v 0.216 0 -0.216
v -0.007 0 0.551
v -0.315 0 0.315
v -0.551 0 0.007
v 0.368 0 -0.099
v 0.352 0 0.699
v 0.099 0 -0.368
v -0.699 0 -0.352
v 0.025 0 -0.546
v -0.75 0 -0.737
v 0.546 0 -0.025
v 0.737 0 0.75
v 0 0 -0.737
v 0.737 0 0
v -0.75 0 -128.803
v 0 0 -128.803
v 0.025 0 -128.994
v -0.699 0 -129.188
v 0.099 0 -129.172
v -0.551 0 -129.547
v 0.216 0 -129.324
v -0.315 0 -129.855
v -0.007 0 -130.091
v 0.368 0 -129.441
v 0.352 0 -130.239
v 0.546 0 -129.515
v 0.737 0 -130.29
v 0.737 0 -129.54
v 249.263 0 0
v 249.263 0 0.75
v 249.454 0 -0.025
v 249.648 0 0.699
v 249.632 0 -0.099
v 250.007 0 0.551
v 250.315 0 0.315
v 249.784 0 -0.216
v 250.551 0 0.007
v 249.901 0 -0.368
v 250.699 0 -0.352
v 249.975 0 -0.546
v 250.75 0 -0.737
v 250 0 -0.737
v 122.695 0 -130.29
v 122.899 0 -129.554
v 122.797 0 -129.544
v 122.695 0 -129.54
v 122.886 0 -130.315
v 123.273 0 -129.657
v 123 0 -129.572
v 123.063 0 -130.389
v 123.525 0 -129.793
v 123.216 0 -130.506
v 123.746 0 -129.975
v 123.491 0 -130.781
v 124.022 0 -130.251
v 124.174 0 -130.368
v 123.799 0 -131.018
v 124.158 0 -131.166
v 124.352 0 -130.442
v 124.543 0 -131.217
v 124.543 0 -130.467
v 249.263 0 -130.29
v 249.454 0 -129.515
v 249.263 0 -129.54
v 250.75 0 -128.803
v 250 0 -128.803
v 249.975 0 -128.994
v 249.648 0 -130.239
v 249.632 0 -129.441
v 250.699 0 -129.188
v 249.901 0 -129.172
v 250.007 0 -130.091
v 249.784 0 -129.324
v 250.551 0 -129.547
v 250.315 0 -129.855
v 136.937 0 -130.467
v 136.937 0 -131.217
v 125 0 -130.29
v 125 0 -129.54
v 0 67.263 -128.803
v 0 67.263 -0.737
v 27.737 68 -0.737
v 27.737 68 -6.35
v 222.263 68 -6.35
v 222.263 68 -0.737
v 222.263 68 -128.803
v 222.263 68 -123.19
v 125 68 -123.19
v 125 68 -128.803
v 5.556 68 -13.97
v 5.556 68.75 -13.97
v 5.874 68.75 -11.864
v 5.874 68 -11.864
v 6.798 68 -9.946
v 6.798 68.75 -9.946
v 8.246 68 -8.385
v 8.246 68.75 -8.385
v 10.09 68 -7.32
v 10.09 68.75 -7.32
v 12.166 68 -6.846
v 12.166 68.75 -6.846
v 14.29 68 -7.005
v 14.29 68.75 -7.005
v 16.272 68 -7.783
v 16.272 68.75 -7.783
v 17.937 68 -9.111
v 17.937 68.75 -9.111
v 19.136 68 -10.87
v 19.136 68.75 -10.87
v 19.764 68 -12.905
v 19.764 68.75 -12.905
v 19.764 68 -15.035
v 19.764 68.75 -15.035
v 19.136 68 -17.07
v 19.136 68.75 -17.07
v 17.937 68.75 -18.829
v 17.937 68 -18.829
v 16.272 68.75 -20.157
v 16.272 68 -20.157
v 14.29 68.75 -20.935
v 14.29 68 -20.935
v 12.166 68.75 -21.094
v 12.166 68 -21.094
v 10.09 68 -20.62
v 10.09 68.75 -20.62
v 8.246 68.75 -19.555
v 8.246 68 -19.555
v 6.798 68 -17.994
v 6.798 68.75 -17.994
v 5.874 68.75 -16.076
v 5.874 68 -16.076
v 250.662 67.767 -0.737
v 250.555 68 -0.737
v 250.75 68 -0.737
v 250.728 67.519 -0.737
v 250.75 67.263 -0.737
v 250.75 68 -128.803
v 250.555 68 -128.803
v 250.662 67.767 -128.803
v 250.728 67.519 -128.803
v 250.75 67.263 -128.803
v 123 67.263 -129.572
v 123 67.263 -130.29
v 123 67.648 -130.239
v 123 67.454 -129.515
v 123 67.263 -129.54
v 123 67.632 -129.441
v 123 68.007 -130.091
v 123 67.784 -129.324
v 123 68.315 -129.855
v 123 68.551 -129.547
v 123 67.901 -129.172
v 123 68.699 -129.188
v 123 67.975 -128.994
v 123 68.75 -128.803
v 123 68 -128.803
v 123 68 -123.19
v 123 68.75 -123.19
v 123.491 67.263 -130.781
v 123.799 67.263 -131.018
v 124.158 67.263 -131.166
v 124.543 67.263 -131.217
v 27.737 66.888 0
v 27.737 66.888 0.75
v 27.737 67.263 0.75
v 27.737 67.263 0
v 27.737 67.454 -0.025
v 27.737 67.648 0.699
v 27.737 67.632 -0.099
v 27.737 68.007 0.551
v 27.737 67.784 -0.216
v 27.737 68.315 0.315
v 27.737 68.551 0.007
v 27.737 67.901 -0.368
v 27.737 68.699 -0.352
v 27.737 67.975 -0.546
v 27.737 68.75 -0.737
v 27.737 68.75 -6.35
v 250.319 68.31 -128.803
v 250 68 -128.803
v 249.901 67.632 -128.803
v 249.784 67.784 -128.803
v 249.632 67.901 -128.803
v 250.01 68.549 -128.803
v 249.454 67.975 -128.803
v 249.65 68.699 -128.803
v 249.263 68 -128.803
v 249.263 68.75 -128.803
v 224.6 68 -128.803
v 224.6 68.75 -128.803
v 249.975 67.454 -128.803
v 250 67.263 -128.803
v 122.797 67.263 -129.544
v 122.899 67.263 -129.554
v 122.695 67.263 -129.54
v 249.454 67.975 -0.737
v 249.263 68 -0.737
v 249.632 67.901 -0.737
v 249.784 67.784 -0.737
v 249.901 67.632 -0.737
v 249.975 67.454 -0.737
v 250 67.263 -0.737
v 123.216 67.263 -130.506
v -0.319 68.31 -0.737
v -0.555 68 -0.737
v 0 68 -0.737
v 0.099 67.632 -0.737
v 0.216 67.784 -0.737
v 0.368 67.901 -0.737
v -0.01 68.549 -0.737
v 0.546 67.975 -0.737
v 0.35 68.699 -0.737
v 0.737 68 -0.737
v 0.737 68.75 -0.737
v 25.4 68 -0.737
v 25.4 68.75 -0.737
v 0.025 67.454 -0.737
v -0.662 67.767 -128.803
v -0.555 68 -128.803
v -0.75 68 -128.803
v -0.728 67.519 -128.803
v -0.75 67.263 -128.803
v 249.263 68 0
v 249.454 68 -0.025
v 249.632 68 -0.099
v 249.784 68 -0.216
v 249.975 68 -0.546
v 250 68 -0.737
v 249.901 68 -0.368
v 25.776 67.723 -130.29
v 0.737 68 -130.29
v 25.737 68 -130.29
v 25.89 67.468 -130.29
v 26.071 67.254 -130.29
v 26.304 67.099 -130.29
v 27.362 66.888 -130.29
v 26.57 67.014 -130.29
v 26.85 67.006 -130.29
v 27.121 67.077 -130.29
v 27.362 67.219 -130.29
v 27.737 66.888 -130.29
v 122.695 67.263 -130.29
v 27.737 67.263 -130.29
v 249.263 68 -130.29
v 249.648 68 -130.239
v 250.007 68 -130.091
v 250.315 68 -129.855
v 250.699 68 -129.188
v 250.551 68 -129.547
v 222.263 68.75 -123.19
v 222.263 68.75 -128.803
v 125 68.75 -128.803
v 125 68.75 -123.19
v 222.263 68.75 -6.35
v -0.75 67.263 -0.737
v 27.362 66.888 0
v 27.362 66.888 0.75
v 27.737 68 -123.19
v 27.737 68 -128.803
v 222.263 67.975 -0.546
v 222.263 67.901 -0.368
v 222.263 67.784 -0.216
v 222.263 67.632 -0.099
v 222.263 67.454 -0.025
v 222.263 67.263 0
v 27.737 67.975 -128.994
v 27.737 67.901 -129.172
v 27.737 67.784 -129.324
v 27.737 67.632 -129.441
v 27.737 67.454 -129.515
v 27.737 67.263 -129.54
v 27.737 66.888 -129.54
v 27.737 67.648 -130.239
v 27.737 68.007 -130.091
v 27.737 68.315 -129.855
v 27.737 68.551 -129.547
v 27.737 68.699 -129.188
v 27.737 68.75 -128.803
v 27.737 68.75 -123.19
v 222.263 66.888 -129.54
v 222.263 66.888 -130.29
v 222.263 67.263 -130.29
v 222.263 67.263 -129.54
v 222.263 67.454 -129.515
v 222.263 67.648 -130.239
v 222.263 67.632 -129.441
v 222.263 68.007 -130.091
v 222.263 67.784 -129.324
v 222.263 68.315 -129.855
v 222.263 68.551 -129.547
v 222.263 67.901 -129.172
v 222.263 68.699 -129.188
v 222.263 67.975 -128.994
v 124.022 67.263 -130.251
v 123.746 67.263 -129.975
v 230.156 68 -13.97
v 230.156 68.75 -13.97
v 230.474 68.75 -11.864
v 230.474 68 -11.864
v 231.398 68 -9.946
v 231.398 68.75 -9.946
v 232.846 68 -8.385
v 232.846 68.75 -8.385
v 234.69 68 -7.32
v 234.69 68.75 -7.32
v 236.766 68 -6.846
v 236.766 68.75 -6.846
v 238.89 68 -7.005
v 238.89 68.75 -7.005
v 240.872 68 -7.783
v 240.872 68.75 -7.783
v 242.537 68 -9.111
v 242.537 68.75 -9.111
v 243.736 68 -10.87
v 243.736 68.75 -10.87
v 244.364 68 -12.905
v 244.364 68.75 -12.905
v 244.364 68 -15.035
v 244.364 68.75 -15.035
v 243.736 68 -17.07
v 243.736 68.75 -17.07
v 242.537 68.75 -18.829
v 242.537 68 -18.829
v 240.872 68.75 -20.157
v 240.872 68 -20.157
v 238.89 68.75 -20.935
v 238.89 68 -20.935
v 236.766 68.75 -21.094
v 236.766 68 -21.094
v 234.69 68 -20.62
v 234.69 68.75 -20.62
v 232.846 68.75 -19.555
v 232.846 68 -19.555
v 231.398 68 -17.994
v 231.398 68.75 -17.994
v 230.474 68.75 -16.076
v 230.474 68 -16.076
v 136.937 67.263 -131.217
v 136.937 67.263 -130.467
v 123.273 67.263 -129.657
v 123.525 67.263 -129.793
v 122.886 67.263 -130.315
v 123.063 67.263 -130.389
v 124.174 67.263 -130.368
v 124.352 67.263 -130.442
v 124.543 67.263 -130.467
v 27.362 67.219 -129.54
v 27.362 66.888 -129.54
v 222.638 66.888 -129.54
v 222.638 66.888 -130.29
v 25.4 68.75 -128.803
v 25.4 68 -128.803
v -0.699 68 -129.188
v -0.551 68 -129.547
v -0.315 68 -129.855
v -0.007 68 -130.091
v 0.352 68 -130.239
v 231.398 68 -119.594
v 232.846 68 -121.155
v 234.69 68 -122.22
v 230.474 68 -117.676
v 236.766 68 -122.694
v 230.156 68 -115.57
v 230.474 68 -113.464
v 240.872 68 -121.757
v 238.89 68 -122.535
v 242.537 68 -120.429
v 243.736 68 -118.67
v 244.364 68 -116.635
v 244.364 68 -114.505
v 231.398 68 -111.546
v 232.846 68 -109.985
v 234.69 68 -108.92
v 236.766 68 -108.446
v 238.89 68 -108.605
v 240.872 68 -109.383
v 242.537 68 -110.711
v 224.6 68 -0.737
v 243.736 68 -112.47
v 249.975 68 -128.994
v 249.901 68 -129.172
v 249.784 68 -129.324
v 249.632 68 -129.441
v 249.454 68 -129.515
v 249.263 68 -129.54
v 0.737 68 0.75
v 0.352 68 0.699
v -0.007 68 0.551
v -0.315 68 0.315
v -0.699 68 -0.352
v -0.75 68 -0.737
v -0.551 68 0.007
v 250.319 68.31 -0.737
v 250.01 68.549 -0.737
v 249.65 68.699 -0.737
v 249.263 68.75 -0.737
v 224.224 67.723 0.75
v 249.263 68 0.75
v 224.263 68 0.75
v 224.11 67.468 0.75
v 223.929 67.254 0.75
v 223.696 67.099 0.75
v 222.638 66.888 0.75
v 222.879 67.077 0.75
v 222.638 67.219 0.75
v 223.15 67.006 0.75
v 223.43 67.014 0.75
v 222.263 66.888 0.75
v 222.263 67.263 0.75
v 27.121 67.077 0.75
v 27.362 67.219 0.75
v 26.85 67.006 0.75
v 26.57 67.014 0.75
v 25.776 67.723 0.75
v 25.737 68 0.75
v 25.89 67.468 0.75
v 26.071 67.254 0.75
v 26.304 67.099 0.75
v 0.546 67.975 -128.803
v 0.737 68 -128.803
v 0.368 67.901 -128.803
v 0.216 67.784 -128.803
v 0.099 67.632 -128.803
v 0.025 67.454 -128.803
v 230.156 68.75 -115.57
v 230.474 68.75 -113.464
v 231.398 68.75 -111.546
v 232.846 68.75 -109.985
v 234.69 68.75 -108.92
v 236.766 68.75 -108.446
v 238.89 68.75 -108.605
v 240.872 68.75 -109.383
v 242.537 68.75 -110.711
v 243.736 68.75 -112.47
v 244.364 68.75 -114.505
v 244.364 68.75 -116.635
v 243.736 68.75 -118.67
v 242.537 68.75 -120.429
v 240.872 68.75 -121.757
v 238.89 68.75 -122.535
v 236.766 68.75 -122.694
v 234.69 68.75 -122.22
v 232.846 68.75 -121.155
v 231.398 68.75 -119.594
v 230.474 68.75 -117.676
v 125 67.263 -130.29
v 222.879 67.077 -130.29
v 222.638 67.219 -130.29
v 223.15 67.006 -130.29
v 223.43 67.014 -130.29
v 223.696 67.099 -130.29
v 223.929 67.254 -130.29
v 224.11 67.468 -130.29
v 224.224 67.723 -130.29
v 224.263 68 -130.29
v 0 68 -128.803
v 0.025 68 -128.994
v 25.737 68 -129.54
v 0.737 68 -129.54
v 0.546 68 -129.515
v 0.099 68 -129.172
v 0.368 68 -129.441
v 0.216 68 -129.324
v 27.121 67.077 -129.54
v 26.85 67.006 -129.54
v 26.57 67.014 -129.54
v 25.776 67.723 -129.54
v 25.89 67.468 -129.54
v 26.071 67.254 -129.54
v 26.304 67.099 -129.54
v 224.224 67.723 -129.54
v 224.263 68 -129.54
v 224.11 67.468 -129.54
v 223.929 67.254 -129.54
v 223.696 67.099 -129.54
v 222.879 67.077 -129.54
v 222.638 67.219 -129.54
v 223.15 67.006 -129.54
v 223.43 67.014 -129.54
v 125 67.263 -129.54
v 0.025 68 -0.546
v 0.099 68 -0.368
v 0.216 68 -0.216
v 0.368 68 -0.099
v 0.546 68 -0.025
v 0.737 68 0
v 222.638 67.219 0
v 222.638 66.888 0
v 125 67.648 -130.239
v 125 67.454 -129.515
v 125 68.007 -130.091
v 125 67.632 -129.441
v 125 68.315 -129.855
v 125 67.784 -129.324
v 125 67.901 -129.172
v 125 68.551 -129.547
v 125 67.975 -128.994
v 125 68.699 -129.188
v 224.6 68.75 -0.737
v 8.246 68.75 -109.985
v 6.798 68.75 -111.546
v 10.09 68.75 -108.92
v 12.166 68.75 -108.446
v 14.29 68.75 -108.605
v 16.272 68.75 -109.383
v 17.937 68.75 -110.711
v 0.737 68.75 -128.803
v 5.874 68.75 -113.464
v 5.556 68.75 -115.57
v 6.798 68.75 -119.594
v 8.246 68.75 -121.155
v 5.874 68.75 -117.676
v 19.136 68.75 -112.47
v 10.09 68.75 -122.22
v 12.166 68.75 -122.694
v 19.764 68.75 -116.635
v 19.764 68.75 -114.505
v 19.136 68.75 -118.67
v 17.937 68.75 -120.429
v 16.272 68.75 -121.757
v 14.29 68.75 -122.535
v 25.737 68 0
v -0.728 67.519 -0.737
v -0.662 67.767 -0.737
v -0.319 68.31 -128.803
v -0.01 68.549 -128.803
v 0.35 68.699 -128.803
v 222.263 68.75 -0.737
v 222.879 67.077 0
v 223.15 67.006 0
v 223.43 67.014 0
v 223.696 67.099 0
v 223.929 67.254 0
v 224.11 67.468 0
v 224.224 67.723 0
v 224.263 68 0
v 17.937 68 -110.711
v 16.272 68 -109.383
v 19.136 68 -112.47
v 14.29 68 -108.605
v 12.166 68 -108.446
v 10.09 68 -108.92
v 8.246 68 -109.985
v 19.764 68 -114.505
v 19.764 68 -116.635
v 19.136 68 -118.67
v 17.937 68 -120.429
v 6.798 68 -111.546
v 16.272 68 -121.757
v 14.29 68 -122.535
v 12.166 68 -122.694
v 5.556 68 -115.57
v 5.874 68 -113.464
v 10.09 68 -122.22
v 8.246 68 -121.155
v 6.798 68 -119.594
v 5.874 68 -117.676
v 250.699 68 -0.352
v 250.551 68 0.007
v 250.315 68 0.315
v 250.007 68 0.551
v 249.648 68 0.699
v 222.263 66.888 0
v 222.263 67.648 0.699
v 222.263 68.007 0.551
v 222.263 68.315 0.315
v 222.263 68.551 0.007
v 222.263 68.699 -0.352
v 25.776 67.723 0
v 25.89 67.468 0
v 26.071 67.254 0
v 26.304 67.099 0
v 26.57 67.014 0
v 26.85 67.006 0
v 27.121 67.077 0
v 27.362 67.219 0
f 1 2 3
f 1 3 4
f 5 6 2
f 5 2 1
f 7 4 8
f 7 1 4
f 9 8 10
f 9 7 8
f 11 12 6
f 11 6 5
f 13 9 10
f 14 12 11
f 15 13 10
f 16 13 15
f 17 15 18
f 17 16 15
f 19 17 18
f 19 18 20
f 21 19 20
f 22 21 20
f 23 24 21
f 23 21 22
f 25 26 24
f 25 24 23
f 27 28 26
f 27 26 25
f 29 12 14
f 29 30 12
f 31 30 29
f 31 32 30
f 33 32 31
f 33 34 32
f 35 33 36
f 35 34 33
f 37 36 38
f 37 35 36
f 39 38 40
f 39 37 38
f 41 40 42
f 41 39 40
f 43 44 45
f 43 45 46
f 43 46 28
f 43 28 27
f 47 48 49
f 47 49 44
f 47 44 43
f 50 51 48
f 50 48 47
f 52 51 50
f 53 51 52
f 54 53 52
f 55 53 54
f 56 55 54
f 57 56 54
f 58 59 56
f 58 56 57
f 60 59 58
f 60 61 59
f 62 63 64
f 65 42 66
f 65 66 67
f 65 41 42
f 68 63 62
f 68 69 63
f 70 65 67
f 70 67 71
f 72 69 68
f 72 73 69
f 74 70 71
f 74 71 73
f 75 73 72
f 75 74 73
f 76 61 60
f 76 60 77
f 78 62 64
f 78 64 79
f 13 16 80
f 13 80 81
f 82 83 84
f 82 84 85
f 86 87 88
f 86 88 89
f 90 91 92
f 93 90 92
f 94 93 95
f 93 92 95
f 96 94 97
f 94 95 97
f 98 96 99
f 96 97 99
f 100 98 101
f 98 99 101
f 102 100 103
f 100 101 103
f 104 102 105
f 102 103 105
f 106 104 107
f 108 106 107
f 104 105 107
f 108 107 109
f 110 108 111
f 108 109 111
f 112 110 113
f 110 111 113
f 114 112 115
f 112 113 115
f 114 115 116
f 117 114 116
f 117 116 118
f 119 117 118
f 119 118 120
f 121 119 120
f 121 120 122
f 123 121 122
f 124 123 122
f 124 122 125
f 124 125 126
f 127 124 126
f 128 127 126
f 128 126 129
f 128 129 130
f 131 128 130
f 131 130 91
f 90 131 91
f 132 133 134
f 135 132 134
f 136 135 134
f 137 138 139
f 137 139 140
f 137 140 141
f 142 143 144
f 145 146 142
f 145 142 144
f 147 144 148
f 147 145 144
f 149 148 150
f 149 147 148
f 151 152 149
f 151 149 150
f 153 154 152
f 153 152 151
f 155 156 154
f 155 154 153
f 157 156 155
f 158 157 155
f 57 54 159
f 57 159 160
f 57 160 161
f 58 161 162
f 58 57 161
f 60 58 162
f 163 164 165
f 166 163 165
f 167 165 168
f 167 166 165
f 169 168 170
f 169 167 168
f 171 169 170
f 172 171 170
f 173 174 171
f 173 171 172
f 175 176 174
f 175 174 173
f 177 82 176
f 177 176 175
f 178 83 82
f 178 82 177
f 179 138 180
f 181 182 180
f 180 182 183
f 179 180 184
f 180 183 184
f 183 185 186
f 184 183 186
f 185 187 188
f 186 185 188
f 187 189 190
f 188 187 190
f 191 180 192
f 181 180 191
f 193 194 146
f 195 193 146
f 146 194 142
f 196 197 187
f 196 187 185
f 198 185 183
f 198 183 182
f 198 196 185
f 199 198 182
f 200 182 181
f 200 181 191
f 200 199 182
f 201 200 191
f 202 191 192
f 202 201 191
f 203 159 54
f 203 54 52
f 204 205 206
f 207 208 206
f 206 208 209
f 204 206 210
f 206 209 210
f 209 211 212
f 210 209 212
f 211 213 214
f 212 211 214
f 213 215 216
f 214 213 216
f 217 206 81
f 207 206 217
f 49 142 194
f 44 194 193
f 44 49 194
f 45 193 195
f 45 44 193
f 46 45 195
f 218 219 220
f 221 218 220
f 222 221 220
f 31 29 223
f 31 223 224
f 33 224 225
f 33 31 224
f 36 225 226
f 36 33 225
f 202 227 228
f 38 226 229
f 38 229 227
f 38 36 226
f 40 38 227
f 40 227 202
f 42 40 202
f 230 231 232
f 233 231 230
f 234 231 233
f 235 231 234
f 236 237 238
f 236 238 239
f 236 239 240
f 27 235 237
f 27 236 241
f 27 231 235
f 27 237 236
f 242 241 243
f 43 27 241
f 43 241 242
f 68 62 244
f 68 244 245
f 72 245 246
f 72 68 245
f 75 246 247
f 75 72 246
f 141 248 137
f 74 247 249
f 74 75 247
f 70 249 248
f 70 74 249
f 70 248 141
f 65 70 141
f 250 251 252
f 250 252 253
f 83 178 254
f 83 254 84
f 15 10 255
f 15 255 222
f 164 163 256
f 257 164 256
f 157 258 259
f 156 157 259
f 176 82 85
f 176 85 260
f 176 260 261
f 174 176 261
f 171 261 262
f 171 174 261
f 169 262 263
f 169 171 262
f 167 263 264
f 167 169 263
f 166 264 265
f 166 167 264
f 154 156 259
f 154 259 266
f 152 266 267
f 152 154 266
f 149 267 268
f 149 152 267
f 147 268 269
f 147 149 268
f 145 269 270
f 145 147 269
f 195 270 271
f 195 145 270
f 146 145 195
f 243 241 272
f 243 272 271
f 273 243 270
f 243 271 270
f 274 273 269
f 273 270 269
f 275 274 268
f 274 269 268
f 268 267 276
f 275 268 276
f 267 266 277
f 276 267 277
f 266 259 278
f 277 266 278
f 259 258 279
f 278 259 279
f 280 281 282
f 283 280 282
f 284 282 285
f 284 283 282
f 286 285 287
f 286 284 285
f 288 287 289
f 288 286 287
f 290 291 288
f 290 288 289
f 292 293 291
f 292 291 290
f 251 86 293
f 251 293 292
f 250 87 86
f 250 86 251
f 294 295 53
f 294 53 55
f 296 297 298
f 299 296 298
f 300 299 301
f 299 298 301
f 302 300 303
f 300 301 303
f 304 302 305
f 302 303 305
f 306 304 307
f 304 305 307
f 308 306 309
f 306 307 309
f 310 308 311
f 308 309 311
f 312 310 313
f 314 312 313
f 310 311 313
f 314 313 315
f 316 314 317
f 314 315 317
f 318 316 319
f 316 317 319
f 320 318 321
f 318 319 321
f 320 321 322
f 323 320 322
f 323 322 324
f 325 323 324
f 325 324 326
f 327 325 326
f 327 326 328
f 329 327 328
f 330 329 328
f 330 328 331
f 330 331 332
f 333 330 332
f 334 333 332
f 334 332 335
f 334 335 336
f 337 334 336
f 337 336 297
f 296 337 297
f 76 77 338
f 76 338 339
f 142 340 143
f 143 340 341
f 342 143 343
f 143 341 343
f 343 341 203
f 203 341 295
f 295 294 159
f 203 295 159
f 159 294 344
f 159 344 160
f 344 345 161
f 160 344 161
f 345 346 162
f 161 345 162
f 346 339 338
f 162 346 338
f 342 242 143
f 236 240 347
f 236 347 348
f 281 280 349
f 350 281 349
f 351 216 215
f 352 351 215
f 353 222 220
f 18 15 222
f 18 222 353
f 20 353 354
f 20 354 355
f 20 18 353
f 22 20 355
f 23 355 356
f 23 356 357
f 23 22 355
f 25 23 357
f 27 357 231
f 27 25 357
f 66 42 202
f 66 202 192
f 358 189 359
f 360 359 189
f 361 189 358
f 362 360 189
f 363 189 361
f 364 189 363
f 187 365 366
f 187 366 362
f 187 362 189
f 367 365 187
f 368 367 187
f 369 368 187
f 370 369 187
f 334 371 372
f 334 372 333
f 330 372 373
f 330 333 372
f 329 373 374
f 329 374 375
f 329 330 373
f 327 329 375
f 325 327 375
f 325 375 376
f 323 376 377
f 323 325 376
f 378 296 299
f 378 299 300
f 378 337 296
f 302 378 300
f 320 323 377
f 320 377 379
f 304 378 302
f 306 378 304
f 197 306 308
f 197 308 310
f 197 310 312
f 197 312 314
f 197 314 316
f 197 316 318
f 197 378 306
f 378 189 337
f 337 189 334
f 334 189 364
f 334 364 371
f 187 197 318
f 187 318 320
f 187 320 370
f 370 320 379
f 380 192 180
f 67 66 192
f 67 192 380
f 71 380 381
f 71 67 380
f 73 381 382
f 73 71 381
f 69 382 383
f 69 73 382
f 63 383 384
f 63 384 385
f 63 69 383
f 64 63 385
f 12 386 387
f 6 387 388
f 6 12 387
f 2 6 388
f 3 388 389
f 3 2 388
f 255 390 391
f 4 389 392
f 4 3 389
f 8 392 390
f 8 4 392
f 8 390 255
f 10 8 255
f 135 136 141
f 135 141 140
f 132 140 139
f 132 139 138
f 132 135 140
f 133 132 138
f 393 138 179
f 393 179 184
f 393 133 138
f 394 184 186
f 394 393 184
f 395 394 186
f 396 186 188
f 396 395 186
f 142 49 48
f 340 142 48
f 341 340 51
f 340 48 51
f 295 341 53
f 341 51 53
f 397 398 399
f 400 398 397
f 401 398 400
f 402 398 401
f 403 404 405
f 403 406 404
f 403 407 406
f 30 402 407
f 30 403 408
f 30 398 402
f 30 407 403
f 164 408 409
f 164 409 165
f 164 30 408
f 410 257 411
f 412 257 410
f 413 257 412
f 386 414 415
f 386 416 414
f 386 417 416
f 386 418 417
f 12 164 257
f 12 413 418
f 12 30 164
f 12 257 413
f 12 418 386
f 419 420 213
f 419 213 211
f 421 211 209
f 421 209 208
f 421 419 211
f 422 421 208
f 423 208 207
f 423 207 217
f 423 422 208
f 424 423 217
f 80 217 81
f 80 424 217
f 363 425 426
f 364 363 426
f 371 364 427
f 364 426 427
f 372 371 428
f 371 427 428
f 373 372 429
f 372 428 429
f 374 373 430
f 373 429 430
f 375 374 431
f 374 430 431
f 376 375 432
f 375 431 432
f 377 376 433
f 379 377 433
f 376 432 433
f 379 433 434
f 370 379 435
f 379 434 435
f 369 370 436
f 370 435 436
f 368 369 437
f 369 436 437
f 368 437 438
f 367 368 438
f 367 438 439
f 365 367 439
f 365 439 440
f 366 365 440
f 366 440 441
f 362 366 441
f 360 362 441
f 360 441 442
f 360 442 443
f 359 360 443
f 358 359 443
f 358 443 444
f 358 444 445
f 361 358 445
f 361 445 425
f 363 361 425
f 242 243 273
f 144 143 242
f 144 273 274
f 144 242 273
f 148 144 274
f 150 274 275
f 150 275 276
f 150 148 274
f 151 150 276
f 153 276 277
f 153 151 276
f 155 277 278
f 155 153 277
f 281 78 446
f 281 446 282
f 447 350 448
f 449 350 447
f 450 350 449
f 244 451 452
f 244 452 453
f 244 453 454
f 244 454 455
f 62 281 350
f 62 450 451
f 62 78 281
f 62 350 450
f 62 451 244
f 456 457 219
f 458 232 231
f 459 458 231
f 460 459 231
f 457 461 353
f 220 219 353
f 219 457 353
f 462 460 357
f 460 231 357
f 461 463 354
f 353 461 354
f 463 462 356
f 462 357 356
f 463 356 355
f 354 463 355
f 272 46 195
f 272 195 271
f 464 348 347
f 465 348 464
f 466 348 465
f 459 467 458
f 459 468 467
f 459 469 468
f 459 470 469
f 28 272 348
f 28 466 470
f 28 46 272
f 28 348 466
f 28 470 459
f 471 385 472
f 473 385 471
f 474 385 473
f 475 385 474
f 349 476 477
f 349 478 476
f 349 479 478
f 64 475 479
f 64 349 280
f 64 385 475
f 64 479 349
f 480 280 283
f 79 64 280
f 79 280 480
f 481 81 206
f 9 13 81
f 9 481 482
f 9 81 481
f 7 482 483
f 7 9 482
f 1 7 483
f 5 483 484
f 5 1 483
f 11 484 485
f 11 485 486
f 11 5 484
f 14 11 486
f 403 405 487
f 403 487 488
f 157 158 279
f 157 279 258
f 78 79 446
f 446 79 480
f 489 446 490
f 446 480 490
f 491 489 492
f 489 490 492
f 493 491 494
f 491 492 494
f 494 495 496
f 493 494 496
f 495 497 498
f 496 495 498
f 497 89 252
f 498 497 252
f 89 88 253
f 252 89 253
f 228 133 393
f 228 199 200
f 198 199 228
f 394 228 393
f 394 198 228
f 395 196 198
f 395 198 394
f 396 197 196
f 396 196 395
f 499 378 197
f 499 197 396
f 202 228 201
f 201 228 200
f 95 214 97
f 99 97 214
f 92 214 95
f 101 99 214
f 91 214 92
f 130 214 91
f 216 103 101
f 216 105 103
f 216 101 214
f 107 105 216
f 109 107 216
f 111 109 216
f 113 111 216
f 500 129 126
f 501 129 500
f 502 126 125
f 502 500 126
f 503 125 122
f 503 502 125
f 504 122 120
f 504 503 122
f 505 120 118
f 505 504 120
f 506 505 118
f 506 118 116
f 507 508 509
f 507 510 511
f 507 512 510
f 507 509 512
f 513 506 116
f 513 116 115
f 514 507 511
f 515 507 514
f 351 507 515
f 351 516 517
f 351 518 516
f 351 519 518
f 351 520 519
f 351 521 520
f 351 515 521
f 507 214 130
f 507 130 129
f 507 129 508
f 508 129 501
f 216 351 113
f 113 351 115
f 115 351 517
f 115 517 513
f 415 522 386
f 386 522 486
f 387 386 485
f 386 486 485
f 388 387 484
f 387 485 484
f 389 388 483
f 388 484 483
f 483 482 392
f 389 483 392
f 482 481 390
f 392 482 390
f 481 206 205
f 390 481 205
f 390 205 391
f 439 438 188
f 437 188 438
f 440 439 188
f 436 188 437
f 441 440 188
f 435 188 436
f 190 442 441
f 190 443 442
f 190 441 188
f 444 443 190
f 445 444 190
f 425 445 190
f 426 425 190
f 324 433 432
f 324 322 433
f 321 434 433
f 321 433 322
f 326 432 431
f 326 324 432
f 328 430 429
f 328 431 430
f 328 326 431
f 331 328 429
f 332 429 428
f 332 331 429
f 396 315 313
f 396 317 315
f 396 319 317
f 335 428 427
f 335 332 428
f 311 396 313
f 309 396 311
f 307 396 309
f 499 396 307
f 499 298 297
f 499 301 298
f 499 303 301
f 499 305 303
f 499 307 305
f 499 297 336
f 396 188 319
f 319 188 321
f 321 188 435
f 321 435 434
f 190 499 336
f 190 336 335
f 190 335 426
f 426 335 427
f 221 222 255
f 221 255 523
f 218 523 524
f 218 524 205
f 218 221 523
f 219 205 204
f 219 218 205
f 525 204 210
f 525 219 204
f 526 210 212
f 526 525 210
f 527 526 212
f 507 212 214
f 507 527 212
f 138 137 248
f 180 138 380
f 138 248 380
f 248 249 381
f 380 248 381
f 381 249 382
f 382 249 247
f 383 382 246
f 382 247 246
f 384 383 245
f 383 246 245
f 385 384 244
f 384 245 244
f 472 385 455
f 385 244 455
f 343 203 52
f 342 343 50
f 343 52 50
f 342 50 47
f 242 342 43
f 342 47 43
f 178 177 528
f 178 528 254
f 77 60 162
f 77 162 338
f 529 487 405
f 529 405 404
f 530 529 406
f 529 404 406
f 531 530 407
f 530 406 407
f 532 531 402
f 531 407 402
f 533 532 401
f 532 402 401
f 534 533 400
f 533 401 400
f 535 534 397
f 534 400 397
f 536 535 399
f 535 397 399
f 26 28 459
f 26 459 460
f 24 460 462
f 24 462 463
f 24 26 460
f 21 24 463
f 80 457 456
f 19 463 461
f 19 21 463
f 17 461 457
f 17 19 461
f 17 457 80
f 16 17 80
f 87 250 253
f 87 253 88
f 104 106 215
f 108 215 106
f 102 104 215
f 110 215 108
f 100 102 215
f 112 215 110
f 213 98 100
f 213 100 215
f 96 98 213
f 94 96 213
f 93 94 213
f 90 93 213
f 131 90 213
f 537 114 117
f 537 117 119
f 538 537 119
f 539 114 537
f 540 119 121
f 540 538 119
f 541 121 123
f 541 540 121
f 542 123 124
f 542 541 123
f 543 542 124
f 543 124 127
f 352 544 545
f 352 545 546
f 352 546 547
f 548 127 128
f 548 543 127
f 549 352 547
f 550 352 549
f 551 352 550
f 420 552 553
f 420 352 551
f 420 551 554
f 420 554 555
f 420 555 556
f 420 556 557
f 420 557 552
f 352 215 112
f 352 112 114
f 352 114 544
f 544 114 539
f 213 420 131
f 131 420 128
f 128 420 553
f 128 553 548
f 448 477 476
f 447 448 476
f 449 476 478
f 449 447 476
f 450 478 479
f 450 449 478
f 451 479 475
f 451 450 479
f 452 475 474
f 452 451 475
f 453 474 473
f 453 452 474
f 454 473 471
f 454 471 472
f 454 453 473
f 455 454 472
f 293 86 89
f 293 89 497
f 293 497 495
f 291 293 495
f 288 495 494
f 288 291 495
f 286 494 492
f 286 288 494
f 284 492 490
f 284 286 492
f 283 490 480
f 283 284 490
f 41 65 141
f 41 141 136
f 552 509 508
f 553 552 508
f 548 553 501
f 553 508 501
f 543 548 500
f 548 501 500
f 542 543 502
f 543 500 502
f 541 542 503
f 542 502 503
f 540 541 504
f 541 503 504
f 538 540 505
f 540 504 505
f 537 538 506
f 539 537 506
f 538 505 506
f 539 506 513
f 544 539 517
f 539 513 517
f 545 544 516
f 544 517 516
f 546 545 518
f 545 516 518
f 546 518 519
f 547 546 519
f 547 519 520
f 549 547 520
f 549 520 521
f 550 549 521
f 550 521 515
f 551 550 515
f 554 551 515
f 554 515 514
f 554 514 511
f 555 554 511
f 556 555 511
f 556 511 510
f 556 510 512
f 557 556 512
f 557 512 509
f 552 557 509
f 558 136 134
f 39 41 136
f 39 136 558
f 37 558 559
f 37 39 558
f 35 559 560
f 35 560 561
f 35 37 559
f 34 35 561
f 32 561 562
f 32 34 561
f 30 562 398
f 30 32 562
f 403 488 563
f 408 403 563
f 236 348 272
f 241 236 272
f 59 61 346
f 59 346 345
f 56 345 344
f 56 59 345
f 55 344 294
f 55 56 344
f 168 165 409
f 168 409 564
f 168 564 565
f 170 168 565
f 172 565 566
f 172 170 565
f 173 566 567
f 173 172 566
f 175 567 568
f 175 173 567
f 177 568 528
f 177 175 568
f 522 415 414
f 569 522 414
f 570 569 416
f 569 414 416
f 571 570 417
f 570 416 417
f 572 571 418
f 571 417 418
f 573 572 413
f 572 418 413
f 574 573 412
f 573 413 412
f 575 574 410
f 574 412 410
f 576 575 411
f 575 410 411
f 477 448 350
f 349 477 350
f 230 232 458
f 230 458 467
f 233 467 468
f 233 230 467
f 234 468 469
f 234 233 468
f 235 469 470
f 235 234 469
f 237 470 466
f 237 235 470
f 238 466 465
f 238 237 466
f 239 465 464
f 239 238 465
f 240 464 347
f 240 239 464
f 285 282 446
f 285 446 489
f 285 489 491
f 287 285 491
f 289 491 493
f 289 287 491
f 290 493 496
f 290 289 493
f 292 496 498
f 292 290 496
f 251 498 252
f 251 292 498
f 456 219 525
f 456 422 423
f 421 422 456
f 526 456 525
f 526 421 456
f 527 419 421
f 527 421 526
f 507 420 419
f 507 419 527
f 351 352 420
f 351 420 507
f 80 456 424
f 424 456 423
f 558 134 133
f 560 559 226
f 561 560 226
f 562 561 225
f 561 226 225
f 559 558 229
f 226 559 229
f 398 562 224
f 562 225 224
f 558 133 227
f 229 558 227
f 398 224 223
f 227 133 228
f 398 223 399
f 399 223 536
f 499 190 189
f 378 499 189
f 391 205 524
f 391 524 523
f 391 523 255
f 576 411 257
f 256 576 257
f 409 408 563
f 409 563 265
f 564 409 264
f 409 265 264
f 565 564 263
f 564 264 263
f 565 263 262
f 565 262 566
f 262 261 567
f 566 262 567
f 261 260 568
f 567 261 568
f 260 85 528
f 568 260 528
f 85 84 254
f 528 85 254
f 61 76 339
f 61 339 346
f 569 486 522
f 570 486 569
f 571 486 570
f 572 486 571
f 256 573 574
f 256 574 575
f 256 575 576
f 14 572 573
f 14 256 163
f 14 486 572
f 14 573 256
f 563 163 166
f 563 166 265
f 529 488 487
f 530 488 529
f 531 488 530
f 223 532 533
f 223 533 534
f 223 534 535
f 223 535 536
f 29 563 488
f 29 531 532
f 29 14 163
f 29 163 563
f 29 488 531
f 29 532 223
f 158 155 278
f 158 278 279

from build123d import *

# Parameters (mm, degrees)
BASE_FLANGE2_DEPTH              = 68
EDGE_FLANGE1_STRIP_W            = 4.4732
EDGE_FLANGE1_STRIP_H            = 0.75
EDGE_FLANGE1_STRIP_CUT_DEPTH    = 128.0668
EDGE_FLANGE1_STRIP_2_W          = 4.4732
EDGE_FLANGE1_STRIP_2_H          = 0.75
EDGE_FLANGE1_STRIP_CUT_2_DEPTH  = 128.0668
EDGE_FLANGE1_DEPTH              = 128.0668
EDGE_FLANGE1_BEND_DEPTH         = 128.0668
CUT_EXTRUDE2_REACH              = 293.159
SKETCH19_R                      = 1
EDGE_FLANGE2_STRIP_W            = 4.4732
EDGE_FLANGE2_STRIP_H            = 0.75
EDGE_FLANGE2_STRIP_CUT_DEPTH    = 194.5268
EDGE_FLANGE2_RELIEF_W           = 4.8482
EDGE_FLANGE2_RELIEF_H           = 0.375
EDGE_FLANGE2_RELIEF_CUT_DEPTH   = 0.75
EDGE_FLANGE2_STRIP_2_W          = 4.4732
EDGE_FLANGE2_STRIP_2_H          = 0.75
EDGE_FLANGE2_STRIP_CUT_2_DEPTH  = 95.2634
EDGE_FLANGE2_RELIEF_2_W         = 4.8482
EDGE_FLANGE2_RELIEF_2_H         = 0.375
EDGE_FLANGE2_RELIEF_CUT_2_DEPTH = 0.75
EDGE_FLANGE2_STRIP_3_W          = 4.4732
EDGE_FLANGE2_STRIP_3_H          = 0.75
EDGE_FLANGE2_STRIP_CUT_3_DEPTH  = 97.2634
EDGE_FLANGE2_RELIEF_3_W         = 4.8482
EDGE_FLANGE2_RELIEF_3_H         = 0.375
EDGE_FLANGE2_RELIEF_CUT_3_DEPTH = 0.75
EDGE_FLANGE2_DEPTH              = 194.5268
EDGE_FLANGE2_BEND_DEPTH         = 95.2634
EDGE_FLANGE2_BEND_2_DEPTH       = 97.2634
EDGE_FLANGE3_DEPTH              = 67.2634
EDGE_FLANGE3_2_DEPTH            = 67.2634
EDGE_FLANGE4_STRIP_CUT_DEPTH    = 67.2634
EDGE_FLANGE4_DEPTH              = 67.2634
CUT_EXTRUDE3_REACH              = 293.239
SKETCH36_R                      = 7.14375


# Read off the part's stored shape, not the designer's step: Edge-Flange3
# Sheet-metal steps are written as plain solids
with BuildPart() as part:
    # Sketch10 → Base-Flange2 (new body)
    with BuildSketch(Plane(origin=(0, 0, 0), x_dir=(1, 0, 0), z_dir=(0, 1, 0))):
        with BuildLine():
            Line((123, 129.54), (0.7366, 129.54))
            ThreePointArc((0.7366, 129.54), (0.215745145, 129.324254855), (0, 128.8034))
            Line((0, 128.8034), (0, 0.7366))
            ThreePointArc((0, 0.7366), (0.215745145, 0.215745145), (0.7366, 0))
            Line((0.7366, 0), (249.2634, 0))
            ThreePointArc((249.2634, 0), (249.784254855, 0.215745145), (250, 0.7366))
            Line((250, 0.7366), (250, 128.8034))
            ThreePointArc((250, 128.8034), (249.784254855, 129.324254855), (249.2634, 129.54))
            Line((249.2634, 129.54), (125, 129.54))
            Line((125, 129.54), (125, 130.29))
            Line((125, 130.29), (249.2634, 130.29))
            ThreePointArc((249.2634, 130.29), (250.314584941, 129.854584941), (250.75, 128.8034))
            Line((250.75, 128.8034), (250.75, 0.7366))
            ThreePointArc((250.75, 0.7366), (250.314584941, -0.314584941), (249.2634, -0.75))
            Line((249.2634, -0.75), (0.7366, -0.75))
            ThreePointArc((0.7366, -0.75), (-0.314584941, -0.314584941), (-0.75, 0.7366))
            Line((-0.75, 0.7366), (-0.75, 128.8034))
            ThreePointArc((-0.75, 128.8034), (-0.314584941, 129.854584941), (0.7366, 130.29))
            Line((0.7366, 130.29), (123, 130.29))
            Line((123, 130.29), (123, 129.54))
        make_face()
    extrude(amount=BASE_FLANGE2_DEPTH)

    # Edge-Flange1 strip (across the edge) → Edge-Flange1 strip cut (cut)
    with BuildSketch(Plane(origin=(0, 68, -128.8034), x_dir=(0, -1, 0), z_dir=(0, 0, 1))):
        with Locations((-1.5, -0.375)):
            Rectangle(EDGE_FLANGE1_STRIP_W, EDGE_FLANGE1_STRIP_H)
    extrude(amount=EDGE_FLANGE1_STRIP_CUT_DEPTH, mode=Mode.SUBTRACT)

    # Edge-Flange1 strip 2 (across the edge) → Edge-Flange1 strip cut 2 (cut)
    with BuildSketch(Plane(origin=(250, 68, -0.7366), x_dir=(0, -1, 0), z_dir=(0, 0, -1))):
        with Locations((-1.5, -0.375)):
            Rectangle(EDGE_FLANGE1_STRIP_2_W, EDGE_FLANGE1_STRIP_2_H)
    extrude(amount=EDGE_FLANGE1_STRIP_CUT_2_DEPTH, mode=Mode.SUBTRACT)

    # Edge-Flange1 section (across the edge) → Edge-Flange1 (add)
    with BuildSketch(Plane(origin=(0, 68, -128.8034), x_dir=(0, -1, 0), z_dir=(0, 0, 1))):
        with BuildLine():
            Line((-0.75, 0.7366), (-0.75, 25.4))
            Line((-0.75, 25.4), (0, 25.4))
            Line((0, 25.4), (0, 0.7366))
            ThreePointArc((0, 0.7366), (0.215745145, 0.215745145), (0.7366, 0))
            Line((0.7366, 0), (0.7366, -0.75))
            ThreePointArc((0.7366, -0.75), (-0.314584941, -0.314584941), (-0.75, 0.7366))
        make_face()
    extrude(amount=EDGE_FLANGE1_DEPTH)

    # Edge-Flange1 section 2 (across the edge) → Edge-Flange1 bend (add)
    with BuildSketch(Plane(origin=(250, 68, -0.7366), x_dir=(0, -1, 0), z_dir=(0, 0, -1))):
        with BuildLine():
            Line((-0.75, 0.7366), (-0.75, 25.4))
            Line((-0.75, 25.4), (0, 25.4))
            Line((0, 25.4), (0, 0.7366))
            ThreePointArc((0, 0.7366), (0.215745145, 0.215745145), (0.7366, 0))
            Line((0.7366, 0), (0.7366, -0.75))
            ThreePointArc((0.7366, -0.75), (-0.314584941, -0.314584941), (-0.75, 0.7366))
        make_face()
    extrude(amount=EDGE_FLANGE1_BEND_DEPTH)

    # Sketch19 → Cut-Extrude2 (cut, up to next)
    with BuildSketch(Plane.XY.offset(0.75), mode=Mode.PRIVATE) as cut_extrude2_sk1:
        with Locations((26.7366, 68)):
            Circle(SKETCH19_R)
    cut_extrude2_tool1 = extrude(cut_extrude2_sk1.sketch, amount=-CUT_EXTRUDE2_REACH, mode=Mode.PRIVATE) & part.part
    # Sketch19 → Cut-Extrude2 (cut, up to next)
    with BuildSketch(Plane.XY.offset(0.75), mode=Mode.PRIVATE) as cut_extrude2_sk2:
        with Locations((223.2634, 68)):
            Circle(SKETCH19_R)
    cut_extrude2_tool2 = extrude(cut_extrude2_sk2.sketch, amount=-CUT_EXTRUDE2_REACH, mode=Mode.PRIVATE) & part.part
    cut_extrude2_1 = cut_extrude2_tool1.solids().sort_by_distance((26.7366, 68, 0.75))[0]
    add(cut_extrude2_1, mode=Mode.SUBTRACT)
    cut_extrude2_2 = cut_extrude2_tool2.solids().sort_by_distance((223.2634, 68, 0.75))[0]
    add(cut_extrude2_2, mode=Mode.SUBTRACT)
    cut_extrude2 = cut_extrude2_1 + cut_extrude2_2  # Cut-Extrude2 as one shape, for the pattern or mirror that repeats it

    # Mirror1: Cut-Extrude2 across plane
    add(cut_extrude2.mirror(Plane.XY.offset(-64.77)), mode=Mode.SUBTRACT)

    # Edge-Flange2 strip (across the edge) → Edge-Flange2 strip cut (cut)
    with BuildSketch(Plane(origin=(27.7366, 68, 0), x_dir=(0, -1, 0), z_dir=(1, 0, 0))):
        with Locations((-1.5, -0.375)):
            Rectangle(EDGE_FLANGE2_STRIP_W, EDGE_FLANGE2_STRIP_H)
    extrude(amount=EDGE_FLANGE2_STRIP_CUT_DEPTH, mode=Mode.SUBTRACT)

    # Edge-Flange2 relief (on the sheet) → Edge-Flange2 relief cut (cut)
    with BuildSketch(Plane(origin=(27.7366, 67.2634, 0), x_dir=(0, -1, 0), z_dir=(0, 0, -1))):
        with Locations((-2.0491, 0.1875)):
            Rectangle(EDGE_FLANGE2_RELIEF_W, EDGE_FLANGE2_RELIEF_H)
        with Locations((-2.0491, -194.7143)):
            Rectangle(EDGE_FLANGE2_RELIEF_W, EDGE_FLANGE2_RELIEF_H)
    extrude(amount=-EDGE_FLANGE2_RELIEF_CUT_DEPTH, mode=Mode.SUBTRACT)

    # Edge-Flange2 strip 2 (across the edge) → Edge-Flange2 strip cut 2 (cut)
    with BuildSketch(Plane(origin=(123, 68, -129.54), x_dir=(0, -1, 0), z_dir=(-1, 0, 0))):
        with Locations((-1.5, -0.375)):
            Rectangle(EDGE_FLANGE2_STRIP_2_W, EDGE_FLANGE2_STRIP_2_H)
    extrude(amount=EDGE_FLANGE2_STRIP_CUT_2_DEPTH, mode=Mode.SUBTRACT)

    # Edge-Flange2 relief 2 (on the sheet) → Edge-Flange2 relief cut 2 (cut)
    with BuildSketch(Plane(origin=(123, 67.2634, -129.54), x_dir=(0, -1, 0), z_dir=(0, 0, 1))):
        with Locations((-2.0491, -95.4509)):
            Rectangle(EDGE_FLANGE2_RELIEF_2_W, EDGE_FLANGE2_RELIEF_2_H)
    extrude(amount=-EDGE_FLANGE2_RELIEF_CUT_2_DEPTH, mode=Mode.SUBTRACT)

    # Edge-Flange2 strip 3 (across the edge) → Edge-Flange2 strip cut 3 (cut)
    with BuildSketch(Plane(origin=(222.2634, 68, -129.54), x_dir=(0, -1, 0), z_dir=(-1, 0, 0))):
        with Locations((-1.5, -0.375)):
            Rectangle(EDGE_FLANGE2_STRIP_3_W, EDGE_FLANGE2_STRIP_3_H)
    extrude(amount=EDGE_FLANGE2_STRIP_CUT_3_DEPTH, mode=Mode.SUBTRACT)

    # Edge-Flange2 relief 3 (on the sheet) → Edge-Flange2 relief cut 3 (cut)
    with BuildSketch(Plane(origin=(222.2634, 67.2634, -129.54), x_dir=(0, -1, 0), z_dir=(0, 0, 1))):
        with Locations((-2.0491, 0.1875)):
            Rectangle(EDGE_FLANGE2_RELIEF_3_W, EDGE_FLANGE2_RELIEF_3_H)
    extrude(amount=-EDGE_FLANGE2_RELIEF_CUT_3_DEPTH, mode=Mode.SUBTRACT)

    # Edge-Flange2 section (across the edge) → Edge-Flange2 (add)
    with BuildSketch(Plane(origin=(27.7366, 68, 0), x_dir=(0, -1, 0), z_dir=(1, 0, 0))):
        with BuildLine():
            Line((-0.75, 0.7366), (-0.75, 6.35))
            Line((-0.75, 6.35), (0, 6.35))
            Line((0, 6.35), (0, 0.7366))
            ThreePointArc((0, 0.7366), (0.215745145, 0.215745145), (0.7366, 0))
            Line((0.7366, 0), (0.7366, -0.75))
            ThreePointArc((0.7366, -0.75), (-0.314584941, -0.314584941), (-0.75, 0.7366))
        make_face()
    extrude(amount=EDGE_FLANGE2_DEPTH)

    # Edge-Flange2 section 2 (across the edge) → Edge-Flange2 bend (add)
    with BuildSketch(Plane(origin=(123, 68, -129.54), x_dir=(0, -1, 0), z_dir=(-1, 0, 0))):
        with BuildLine():
            Line((-0.75, 0.7366), (-0.75, 6.35))
            Line((-0.75, 6.35), (0, 6.35))
            Line((0, 6.35), (0, 0.7366))
            ThreePointArc((0, 0.7366), (0.215745145, 0.215745145), (0.7366, 0))
            Line((0.7366, 0), (0.7366, -0.75))
            ThreePointArc((0.7366, -0.75), (-0.314584941, -0.314584941), (-0.75, 0.7366))
        make_face()
    extrude(amount=EDGE_FLANGE2_BEND_DEPTH)

    # Edge-Flange2 section 3 (across the edge) → Edge-Flange2 bend 2 (add)
    with BuildSketch(Plane(origin=(222.2634, 68, -129.54), x_dir=(0, -1, 0), z_dir=(-1, 0, 0))):
        with BuildLine():
            Line((-0.75, 0.7366), (-0.75, 6.35))
            Line((-0.75, 6.35), (0, 6.35))
            Line((0, 6.35), (0, 0.7366))
            ThreePointArc((0, 0.7366), (0.215745145, 0.215745145), (0.7366, 0))
            Line((0.7366, 0), (0.7366, -0.75))
            ThreePointArc((0.7366, -0.75), (-0.314584941, -0.314584941), (-0.75, 0.7366))
        make_face()
    extrude(amount=EDGE_FLANGE2_BEND_2_DEPTH)

    # Edge-Flange3 outline → Edge-Flange3 (cut)
    with BuildSketch(Plane(origin=(0, 0, 0), x_dir=(1, 0, 0), z_dir=(0, 1, 0))):
        with BuildLine():
            Line((123, 129.54), (123, 129.571647209))
            ThreePointArc((123, 129.571647209), (122.848263594, 129.547932969), (122.69489029, 129.54))
            Line((122.69489029, 129.54), (123, 129.54))
        make_face()
    extrude(amount=EDGE_FLANGE3_DEPTH, mode=Mode.SUBTRACT)

    # Edge-Flange3 2 outline → Edge-Flange3 2 (add)
    with BuildSketch(Plane(origin=(0, 0, 0), x_dir=(1, 0, 0), z_dir=(0, 1, 0))):
        with BuildLine():
            ThreePointArc((123, 129.571647209), (123.402450121, 129.719183216), (123.746075231, 129.975415059))
            Line((123.746075231, 129.975415059), (124.237436867, 130.466776695))
            Line((124.237436867, 130.466776695), (123.707106781, 130.997106781))
            Line((123.707106781, 130.997106781), (123.215745145, 130.505745145))
            ThreePointArc((123.215745145, 130.505745145), (122.976774906, 130.346070336), (122.69489029, 130.29))
            Line((122.69489029, 130.29), (123, 130.29))
            Line((123, 130.29), (123, 129.571647209))
        make_face()
    extrude(amount=EDGE_FLANGE3_2_DEPTH)

    # Edge-Flange4 strip (across the edge) → Edge-Flange4 strip cut (cut)
    with BuildSketch(Plane(origin=(124.237436867, 0, -130.466776695), x_dir=(0, 0, 1), z_dir=(0, 1, 0))):
        Polygon((-3.477614995, 2.416954823), (-0.314584941, -0.746075231), (0.215745145, -0.215745145), (-2.947284909, 2.947284909), align=None)
    extrude(amount=EDGE_FLANGE4_STRIP_CUT_DEPTH, mode=Mode.SUBTRACT)

    # Edge-Flange4 section (across the edge) → Edge-Flange4 (add)
    with BuildSketch(Plane(origin=(124.237436867, 0, -130.466776695), x_dir=(0, 0, 1), z_dir=(0, 1, 0))):
        with BuildLine():
            Line((-0.75, 0.30510971), (-0.75, 12.7))
            Line((-0.75, 12.7), (0, 12.7))
            Line((0, 12.7), (0, 0.30510971))
            ThreePointArc((0, 0.30510971), (0.056070336, 0.023225094), (0.215745145, -0.215745145))
            Line((0.215745145, -0.215745145), (-0.314584941, -0.746075231))
            ThreePointArc((-0.314584941, -0.746075231), (-0.636839313, -0.263787481), (-0.75, 0.30510971))
        make_face()
    extrude(amount=EDGE_FLANGE4_DEPTH)

    # Sketch36 → Cut-Extrude3 (cut, up to next)
    with BuildSketch(Plane(origin=(0, 68.75, 0), x_dir=(1, 0, 0), z_dir=(0, 1, 0)), mode=Mode.PRIVATE) as cut_extrude3_sk1:
        with Locations(Location((12.7, 115.57, 0), (0, 0, 180))):
            Circle(SKETCH36_R)
    cut_extrude3_tool1 = extrude(cut_extrude3_sk1.sketch, amount=-CUT_EXTRUDE3_REACH, mode=Mode.PRIVATE) & part.part
    # Sketch36 → Cut-Extrude3 (cut, up to next)
    with BuildSketch(Plane(origin=(0, 68.75, 0), x_dir=(1, 0, 0), z_dir=(0, 1, 0)), mode=Mode.PRIVATE) as cut_extrude3_sk2:
        with Locations(Location((237.3, 115.57, 0), (0, 0, 180))):
            Circle(SKETCH36_R)
    cut_extrude3_tool2 = extrude(cut_extrude3_sk2.sketch, amount=-CUT_EXTRUDE3_REACH, mode=Mode.PRIVATE) & part.part
    # Sketch36 → Cut-Extrude3 (cut, up to next)
    with BuildSketch(Plane(origin=(0, 68.75, 0), x_dir=(1, 0, 0), z_dir=(0, 1, 0)), mode=Mode.PRIVATE) as cut_extrude3_sk3:
        with Locations(Location((237.3, 13.97, 0), (0, 0, 180))):
            Circle(SKETCH36_R)
    cut_extrude3_tool3 = extrude(cut_extrude3_sk3.sketch, amount=-CUT_EXTRUDE3_REACH, mode=Mode.PRIVATE) & part.part
    # Sketch36 → Cut-Extrude3 (cut, up to next)
    with BuildSketch(Plane(origin=(0, 68.75, 0), x_dir=(1, 0, 0), z_dir=(0, 1, 0)), mode=Mode.PRIVATE) as cut_extrude3_sk4:
        with Locations(Location((12.7, 13.97, 0), (0, 0, 180))):
            Circle(SKETCH36_R)
    cut_extrude3_tool4 = extrude(cut_extrude3_sk4.sketch, amount=-CUT_EXTRUDE3_REACH, mode=Mode.PRIVATE) & part.part
    add(cut_extrude3_tool1.solids().sort_by_distance((12.7, 68.75, -115.57))[0], mode=Mode.SUBTRACT)
    add(cut_extrude3_tool2.solids().sort_by_distance((237.3, 68.75, -115.57))[0], mode=Mode.SUBTRACT)
    add(cut_extrude3_tool3.solids().sort_by_distance((237.3, 68.75, -13.97))[0], mode=Mode.SUBTRACT)
    add(cut_extrude3_tool4.solids().sort_by_distance((12.7, 68.75, -13.97))[0], mode=Mode.SUBTRACT)


solid = part.part
